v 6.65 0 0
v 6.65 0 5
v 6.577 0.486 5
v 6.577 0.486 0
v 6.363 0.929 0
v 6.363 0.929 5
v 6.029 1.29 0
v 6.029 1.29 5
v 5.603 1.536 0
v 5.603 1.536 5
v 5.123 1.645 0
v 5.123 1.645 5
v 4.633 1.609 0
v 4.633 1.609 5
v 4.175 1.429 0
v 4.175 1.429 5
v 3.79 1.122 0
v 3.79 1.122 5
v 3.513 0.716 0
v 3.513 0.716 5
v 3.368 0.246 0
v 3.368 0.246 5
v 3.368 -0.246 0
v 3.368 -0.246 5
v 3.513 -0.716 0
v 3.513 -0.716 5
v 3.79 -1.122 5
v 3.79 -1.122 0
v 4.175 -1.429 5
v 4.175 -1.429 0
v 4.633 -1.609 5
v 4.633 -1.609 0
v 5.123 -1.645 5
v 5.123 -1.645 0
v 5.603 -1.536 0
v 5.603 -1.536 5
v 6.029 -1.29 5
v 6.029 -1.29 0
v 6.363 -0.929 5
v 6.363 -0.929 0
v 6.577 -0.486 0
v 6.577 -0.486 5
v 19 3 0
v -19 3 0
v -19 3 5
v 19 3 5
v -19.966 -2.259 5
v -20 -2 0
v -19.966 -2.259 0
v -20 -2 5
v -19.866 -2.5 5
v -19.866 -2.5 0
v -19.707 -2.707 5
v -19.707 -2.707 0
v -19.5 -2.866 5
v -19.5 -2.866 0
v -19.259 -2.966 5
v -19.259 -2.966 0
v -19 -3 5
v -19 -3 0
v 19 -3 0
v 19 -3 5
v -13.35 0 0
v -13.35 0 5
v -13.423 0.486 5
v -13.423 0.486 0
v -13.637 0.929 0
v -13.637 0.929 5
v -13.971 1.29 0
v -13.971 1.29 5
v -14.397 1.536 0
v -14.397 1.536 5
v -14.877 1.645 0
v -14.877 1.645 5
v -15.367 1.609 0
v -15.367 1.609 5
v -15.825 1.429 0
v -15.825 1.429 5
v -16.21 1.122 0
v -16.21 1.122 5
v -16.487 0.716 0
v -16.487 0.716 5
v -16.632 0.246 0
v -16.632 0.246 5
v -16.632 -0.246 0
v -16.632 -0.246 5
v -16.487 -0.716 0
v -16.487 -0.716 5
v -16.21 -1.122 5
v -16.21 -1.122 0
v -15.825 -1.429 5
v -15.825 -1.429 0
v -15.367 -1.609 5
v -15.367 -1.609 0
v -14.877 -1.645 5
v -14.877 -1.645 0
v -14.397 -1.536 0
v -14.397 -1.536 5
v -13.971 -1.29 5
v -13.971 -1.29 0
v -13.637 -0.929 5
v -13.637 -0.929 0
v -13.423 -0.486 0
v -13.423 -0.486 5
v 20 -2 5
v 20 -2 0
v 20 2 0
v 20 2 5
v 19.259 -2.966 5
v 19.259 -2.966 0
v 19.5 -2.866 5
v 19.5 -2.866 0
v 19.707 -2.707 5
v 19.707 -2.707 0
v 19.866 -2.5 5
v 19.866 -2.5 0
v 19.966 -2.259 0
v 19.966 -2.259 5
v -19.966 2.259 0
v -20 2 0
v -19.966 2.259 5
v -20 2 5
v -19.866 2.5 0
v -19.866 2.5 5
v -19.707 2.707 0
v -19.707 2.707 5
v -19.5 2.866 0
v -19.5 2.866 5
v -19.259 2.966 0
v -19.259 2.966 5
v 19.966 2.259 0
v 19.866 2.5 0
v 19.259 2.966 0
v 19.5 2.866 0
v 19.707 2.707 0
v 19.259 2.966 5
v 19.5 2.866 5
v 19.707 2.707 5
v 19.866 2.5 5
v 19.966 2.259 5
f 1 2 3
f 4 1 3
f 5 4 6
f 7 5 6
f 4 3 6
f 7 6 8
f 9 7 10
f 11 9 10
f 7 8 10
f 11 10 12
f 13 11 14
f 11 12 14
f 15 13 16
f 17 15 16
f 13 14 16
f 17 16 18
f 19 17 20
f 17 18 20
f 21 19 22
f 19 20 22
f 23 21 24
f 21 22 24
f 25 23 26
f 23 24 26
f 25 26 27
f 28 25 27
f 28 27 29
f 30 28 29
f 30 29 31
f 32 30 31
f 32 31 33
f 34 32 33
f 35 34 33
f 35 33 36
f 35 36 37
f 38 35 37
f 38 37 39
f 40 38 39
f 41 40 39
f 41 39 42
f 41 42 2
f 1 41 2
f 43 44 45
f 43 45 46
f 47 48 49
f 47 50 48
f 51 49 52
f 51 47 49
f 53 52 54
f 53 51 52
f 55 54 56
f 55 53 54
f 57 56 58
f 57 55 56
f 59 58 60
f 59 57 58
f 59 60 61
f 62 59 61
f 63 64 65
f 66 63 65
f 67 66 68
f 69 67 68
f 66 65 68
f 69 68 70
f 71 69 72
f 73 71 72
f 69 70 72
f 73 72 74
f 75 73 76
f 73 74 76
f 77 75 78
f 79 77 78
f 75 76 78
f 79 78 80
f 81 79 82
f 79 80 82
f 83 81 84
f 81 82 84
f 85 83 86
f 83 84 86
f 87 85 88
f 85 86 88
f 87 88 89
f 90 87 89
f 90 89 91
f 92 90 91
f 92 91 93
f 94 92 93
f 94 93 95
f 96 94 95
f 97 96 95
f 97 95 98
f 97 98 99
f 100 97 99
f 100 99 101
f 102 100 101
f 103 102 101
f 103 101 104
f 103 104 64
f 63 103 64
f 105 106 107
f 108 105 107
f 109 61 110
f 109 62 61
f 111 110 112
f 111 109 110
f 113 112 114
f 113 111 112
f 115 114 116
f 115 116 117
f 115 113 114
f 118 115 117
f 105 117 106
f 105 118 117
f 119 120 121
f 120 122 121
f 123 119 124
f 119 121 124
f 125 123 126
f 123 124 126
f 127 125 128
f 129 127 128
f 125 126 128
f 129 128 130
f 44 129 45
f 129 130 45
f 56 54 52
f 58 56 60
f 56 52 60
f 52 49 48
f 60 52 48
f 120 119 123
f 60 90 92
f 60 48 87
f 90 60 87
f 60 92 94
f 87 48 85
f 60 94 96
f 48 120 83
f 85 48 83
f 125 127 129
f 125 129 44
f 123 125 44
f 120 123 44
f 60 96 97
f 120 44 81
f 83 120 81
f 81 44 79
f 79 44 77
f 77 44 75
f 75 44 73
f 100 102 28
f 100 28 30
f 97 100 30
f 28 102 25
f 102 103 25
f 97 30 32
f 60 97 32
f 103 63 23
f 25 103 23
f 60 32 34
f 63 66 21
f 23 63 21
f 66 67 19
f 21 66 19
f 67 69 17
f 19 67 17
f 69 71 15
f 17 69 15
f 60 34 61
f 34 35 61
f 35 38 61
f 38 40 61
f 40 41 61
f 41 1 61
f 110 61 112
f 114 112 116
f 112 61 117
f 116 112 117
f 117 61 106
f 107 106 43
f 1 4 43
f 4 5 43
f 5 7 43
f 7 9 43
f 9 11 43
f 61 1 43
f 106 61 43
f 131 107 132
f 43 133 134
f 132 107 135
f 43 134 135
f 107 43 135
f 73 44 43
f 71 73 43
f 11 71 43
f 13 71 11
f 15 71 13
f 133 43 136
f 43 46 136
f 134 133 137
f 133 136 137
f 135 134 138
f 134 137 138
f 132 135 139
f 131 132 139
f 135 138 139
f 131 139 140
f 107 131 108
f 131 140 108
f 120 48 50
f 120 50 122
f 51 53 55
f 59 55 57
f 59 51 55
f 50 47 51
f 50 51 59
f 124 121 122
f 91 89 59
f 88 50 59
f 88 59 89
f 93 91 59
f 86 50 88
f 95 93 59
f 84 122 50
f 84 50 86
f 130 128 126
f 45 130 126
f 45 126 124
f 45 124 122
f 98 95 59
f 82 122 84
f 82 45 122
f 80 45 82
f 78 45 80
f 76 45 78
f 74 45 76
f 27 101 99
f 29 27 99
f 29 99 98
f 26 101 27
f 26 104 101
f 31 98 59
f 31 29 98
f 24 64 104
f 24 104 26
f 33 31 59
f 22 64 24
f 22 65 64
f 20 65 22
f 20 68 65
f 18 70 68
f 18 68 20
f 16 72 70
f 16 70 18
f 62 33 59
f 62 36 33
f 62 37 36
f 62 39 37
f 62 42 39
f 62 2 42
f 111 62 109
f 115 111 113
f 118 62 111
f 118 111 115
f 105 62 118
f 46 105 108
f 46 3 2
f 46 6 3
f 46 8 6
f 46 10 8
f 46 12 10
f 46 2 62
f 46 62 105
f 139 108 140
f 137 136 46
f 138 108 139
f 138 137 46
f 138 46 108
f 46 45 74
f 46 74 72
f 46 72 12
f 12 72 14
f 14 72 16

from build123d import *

# Parameters (mm, degrees)
SKETCH_1_W          = 40
SKETCH_1_H          = 6
EXTRUDE_1_DEPTH     = 5
SKETCH_2_R          = 1.65
CUT_EXTRUDE_1_DEPTH = 7
FILLET_1_R          = 1


with BuildPart() as part:
    # 草图1 → 凸台-拉伸1 (new body)
    with BuildSketch(Plane.XY):
        Rectangle(SKETCH_1_W, SKETCH_1_H)
    extrude(amount=EXTRUDE_1_DEPTH)

    # 草图2 → 切除-拉伸1 (cut)
    with BuildSketch(Plane.XY.offset(5)):
        with Locations((5, 0)):
            Circle(SKETCH_2_R)
        with Locations((-15, 0)):
            Circle(SKETCH_2_R)
    extrude(amount=-CUT_EXTRUDE_1_DEPTH, mode=Mode.SUBTRACT)

    # 圆角1
    fillet_1_edges = [part.edges().sort_by_distance(p)[0] for p in [
        (20, -3, 2.5),
        (-20, -3, 2.5),
        (-20, 3, 2.5),
        (20, 3, 2.5),
    ]]
    fillet(fillet_1_edges, radius=FILLET_1_R)


solid = part.part
